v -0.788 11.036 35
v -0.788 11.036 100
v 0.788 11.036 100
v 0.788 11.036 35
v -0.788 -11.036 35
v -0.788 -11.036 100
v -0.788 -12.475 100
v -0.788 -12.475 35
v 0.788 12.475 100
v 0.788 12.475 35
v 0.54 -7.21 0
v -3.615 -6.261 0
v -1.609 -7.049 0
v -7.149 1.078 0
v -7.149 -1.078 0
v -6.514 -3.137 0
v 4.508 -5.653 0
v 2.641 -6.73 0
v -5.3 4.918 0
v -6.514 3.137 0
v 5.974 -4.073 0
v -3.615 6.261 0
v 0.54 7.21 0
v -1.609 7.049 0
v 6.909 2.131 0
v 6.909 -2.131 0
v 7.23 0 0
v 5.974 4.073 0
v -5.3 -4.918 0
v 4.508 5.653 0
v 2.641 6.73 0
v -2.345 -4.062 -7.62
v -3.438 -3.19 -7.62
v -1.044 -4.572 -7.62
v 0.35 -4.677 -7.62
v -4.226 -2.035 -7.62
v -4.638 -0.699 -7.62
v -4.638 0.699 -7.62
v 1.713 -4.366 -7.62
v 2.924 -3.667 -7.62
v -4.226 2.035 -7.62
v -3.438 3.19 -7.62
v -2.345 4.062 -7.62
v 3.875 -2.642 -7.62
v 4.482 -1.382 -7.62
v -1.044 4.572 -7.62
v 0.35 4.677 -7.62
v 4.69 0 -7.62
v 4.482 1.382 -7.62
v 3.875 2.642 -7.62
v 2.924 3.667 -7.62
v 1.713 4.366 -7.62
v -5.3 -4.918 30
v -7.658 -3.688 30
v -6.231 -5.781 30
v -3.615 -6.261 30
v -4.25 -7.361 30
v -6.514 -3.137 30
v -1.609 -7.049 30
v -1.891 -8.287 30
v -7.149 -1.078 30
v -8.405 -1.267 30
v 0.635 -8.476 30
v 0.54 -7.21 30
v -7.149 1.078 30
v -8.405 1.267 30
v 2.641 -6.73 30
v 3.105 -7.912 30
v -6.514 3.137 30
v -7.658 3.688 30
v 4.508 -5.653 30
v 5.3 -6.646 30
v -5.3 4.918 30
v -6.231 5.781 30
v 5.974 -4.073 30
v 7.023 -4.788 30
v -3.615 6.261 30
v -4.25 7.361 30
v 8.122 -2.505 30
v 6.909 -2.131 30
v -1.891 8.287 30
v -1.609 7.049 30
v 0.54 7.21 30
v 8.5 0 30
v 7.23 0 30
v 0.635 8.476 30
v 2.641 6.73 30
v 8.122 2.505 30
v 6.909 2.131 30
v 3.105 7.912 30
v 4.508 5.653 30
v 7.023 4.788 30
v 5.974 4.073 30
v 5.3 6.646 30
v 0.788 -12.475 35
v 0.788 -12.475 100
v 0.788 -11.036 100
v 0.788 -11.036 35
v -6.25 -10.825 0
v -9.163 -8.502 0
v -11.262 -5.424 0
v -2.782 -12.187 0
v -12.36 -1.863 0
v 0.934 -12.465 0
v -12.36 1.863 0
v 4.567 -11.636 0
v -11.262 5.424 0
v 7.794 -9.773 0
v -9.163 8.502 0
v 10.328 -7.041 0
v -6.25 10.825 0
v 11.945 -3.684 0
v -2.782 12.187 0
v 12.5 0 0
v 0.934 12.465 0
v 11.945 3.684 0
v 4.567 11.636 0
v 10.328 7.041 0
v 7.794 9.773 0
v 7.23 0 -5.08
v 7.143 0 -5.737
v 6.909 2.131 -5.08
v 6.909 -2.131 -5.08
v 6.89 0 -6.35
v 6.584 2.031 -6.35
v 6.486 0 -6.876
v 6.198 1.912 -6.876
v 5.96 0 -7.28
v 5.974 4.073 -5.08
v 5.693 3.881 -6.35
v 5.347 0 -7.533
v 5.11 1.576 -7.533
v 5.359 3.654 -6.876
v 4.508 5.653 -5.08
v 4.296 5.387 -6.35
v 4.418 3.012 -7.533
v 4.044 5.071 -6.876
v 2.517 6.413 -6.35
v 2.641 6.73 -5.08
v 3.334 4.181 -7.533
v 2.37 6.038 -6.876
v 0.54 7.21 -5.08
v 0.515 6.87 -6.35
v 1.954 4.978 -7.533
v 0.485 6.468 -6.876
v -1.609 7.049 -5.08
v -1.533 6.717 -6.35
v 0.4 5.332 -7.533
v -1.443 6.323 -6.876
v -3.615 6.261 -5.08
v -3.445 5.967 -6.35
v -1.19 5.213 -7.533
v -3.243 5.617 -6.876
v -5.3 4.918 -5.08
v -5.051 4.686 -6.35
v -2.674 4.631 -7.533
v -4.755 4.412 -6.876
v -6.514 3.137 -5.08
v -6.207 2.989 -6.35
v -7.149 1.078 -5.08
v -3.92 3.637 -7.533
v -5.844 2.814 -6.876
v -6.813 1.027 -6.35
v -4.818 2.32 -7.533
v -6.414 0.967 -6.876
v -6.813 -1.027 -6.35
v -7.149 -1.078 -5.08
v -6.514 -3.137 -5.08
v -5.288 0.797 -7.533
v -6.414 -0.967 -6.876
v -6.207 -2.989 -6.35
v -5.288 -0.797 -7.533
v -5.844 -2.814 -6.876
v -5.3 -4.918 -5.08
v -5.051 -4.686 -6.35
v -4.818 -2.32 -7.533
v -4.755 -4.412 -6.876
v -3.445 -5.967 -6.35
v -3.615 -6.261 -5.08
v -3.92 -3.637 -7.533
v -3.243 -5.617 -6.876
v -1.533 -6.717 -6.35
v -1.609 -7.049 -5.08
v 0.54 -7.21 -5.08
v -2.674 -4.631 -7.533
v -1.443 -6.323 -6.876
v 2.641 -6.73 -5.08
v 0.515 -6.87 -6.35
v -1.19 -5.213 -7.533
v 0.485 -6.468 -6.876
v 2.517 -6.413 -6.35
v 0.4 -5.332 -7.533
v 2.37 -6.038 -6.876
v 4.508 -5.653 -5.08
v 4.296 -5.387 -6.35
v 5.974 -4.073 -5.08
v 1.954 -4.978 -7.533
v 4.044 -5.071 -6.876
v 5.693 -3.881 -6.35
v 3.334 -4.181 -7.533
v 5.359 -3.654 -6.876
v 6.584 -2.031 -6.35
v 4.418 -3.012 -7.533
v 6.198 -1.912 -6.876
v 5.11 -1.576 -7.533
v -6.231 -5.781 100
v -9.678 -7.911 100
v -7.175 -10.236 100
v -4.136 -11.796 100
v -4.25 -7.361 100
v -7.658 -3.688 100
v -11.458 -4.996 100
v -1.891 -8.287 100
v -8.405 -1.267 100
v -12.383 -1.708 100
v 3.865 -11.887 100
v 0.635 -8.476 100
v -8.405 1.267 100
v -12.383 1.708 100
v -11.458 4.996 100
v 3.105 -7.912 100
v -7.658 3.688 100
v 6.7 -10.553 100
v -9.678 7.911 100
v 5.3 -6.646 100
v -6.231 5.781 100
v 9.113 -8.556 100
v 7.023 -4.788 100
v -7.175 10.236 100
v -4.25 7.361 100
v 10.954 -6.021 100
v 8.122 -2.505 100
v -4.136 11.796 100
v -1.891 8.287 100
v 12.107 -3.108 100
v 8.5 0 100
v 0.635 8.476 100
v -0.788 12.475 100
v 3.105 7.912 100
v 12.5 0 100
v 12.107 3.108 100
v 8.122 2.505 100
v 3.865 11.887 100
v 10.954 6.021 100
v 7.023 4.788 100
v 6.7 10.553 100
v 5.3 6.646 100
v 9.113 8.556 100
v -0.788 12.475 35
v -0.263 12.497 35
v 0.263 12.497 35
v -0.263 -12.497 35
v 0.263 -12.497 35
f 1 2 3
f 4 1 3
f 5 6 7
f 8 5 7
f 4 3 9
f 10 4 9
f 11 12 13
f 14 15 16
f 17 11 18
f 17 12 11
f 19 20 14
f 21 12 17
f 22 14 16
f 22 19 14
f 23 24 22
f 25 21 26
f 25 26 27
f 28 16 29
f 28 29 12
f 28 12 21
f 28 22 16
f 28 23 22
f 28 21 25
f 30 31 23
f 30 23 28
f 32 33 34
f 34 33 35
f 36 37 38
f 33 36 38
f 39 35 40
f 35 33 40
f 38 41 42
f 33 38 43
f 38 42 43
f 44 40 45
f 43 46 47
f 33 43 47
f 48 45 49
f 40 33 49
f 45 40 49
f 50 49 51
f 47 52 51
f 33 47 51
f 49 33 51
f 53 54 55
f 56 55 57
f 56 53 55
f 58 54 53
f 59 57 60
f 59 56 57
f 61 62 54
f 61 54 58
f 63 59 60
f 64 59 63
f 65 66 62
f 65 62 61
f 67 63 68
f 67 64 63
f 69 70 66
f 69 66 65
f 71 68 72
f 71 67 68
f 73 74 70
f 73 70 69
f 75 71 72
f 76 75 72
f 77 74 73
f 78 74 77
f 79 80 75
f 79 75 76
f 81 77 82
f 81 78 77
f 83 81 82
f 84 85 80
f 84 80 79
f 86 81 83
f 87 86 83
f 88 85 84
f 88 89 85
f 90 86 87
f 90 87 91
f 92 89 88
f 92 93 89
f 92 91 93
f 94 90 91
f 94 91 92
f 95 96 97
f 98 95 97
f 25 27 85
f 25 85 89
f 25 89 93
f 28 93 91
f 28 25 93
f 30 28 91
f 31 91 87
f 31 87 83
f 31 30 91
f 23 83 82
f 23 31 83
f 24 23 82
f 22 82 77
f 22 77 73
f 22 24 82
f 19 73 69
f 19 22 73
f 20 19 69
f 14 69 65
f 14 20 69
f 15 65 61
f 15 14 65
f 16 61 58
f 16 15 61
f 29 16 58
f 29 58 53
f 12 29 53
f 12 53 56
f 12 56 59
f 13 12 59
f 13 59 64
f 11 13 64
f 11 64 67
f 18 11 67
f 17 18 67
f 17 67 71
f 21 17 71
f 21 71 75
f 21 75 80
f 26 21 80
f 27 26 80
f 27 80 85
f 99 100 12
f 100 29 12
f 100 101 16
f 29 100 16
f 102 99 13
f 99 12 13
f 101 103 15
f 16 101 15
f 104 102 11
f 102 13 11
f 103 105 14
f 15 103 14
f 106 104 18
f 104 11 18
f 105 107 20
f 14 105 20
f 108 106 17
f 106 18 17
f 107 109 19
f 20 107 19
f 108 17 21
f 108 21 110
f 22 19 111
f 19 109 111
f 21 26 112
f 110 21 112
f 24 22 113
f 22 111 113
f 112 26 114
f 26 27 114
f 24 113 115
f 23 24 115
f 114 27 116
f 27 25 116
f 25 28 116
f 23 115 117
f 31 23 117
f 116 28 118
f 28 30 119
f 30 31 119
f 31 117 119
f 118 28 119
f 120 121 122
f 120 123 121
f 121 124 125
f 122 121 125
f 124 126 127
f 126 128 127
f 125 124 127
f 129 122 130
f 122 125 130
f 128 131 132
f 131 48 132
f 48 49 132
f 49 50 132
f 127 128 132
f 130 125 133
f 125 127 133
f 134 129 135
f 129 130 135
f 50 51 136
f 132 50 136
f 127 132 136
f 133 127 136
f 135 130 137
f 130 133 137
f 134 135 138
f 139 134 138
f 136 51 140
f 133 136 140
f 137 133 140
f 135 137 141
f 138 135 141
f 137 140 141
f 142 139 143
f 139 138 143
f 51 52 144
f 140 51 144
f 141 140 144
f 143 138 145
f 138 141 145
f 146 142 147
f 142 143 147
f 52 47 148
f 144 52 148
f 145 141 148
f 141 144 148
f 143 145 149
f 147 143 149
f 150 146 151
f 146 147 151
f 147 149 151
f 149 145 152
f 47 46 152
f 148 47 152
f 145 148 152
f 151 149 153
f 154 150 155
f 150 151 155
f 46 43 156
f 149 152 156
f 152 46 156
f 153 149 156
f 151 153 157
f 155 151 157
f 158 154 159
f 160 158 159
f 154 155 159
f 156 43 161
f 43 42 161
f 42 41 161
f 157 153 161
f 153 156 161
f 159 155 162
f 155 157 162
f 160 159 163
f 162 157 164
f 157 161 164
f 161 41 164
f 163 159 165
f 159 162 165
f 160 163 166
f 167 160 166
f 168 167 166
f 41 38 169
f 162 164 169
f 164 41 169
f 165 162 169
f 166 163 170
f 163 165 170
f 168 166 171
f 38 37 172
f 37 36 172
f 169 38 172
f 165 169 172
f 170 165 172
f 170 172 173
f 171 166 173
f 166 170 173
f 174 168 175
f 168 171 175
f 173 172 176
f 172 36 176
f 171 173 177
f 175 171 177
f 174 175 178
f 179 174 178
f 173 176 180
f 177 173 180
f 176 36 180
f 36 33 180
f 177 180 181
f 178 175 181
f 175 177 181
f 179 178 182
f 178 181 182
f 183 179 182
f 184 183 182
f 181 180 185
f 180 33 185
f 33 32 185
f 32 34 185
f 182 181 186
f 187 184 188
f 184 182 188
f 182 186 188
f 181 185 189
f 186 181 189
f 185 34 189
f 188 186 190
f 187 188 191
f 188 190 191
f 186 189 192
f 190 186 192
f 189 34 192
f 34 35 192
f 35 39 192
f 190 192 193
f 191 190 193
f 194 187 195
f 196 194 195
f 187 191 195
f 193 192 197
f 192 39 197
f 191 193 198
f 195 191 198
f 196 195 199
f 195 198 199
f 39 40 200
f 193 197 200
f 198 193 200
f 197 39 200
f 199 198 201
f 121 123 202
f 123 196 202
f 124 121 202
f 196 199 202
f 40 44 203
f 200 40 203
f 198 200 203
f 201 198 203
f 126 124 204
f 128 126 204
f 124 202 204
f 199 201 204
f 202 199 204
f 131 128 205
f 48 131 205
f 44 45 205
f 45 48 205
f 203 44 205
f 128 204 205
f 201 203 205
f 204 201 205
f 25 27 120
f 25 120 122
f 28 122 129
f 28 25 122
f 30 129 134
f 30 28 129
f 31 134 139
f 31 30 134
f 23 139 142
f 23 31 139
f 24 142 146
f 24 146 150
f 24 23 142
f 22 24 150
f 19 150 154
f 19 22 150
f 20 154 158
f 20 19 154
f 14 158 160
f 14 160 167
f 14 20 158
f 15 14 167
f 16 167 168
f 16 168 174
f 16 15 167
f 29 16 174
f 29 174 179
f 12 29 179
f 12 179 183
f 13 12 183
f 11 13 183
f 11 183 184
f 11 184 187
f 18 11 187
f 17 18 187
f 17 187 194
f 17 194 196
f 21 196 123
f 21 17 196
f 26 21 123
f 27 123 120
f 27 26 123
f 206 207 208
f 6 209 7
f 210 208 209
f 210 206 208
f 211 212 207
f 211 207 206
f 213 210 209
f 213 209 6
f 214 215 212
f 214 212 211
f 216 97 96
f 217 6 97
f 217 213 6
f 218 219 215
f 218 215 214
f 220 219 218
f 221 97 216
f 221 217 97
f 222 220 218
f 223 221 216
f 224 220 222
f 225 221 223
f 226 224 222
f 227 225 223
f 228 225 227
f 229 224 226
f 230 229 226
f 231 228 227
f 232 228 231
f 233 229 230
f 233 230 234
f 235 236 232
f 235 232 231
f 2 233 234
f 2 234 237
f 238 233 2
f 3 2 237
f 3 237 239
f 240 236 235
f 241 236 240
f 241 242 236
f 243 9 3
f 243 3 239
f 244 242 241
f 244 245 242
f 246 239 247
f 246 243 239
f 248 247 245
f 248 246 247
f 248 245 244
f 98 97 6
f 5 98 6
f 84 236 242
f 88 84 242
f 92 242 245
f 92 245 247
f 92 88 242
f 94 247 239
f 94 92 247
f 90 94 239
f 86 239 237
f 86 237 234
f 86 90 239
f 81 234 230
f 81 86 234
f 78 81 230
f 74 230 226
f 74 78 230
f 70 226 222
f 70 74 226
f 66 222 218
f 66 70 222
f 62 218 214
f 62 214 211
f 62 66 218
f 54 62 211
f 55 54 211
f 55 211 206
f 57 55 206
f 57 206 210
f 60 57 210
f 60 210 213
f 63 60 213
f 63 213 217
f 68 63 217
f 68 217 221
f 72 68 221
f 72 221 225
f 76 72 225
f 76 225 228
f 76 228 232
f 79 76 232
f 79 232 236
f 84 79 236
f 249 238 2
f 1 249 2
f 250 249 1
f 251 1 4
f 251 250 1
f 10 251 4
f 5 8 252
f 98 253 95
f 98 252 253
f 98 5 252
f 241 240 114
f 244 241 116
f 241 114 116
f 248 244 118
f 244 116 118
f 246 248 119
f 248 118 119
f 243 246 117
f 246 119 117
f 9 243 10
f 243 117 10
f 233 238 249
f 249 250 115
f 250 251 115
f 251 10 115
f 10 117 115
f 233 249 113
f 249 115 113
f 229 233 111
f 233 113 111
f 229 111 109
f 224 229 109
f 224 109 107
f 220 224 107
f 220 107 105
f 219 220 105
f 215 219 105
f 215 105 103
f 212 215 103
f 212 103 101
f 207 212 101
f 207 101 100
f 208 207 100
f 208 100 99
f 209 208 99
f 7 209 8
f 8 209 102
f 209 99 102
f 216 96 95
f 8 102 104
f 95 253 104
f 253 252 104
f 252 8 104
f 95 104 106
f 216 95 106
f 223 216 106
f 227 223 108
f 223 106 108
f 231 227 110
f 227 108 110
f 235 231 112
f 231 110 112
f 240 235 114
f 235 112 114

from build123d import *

# Parameters (mm, degrees)
F0_R     = 12.4999877
F0_R_2   = 8.4999957
F1_DEPTH = 100.000054
F0_R_3   = 7.2299957
F2_DEPTH = 5.08
F3_DEPTH = 29.99994
F5_DEPTH = 7.62
F6_R     = 2.54
F8_DEPTH = 65.000124


# Not quite as in the source:
# - a feature names something its author has since deleted; it is built from what else it names


with BuildPart() as f1:
    # F0 (on Top) → F1 (new body)
    with BuildSketch(Plane.XY):
        Circle(F0_R)
        Circle(F0_R_2, mode=Mode.SUBTRACT)
    extrude(amount=F1_DEPTH)

    # F0 (on Top) → F2 (join)
    with BuildSketch(Plane.XY):
        Circle(F0_R_2)
        Circle(F0_R_3, mode=Mode.SUBTRACT)
    extrude(amount=F2_DEPTH)

    # F0 (on Top) → F3 (join)
    with BuildSketch(Plane.XY):
        Circle(F0_R_2)
        Circle(F0_R_3, mode=Mode.SUBTRACT)
    extrude(amount=F3_DEPTH)

    # F7 (on face) → F8 (cut)
    with BuildSketch(Plane.XY.offset(100.000054)):
        Polygon((-0.7882758509, 11.0358614475), (0, 11.0358614475), (0.7882758509, 11.0358614475), (0.7882758509, 16.8001297861), (0, 16.8001297861), (-0.7882758509, 16.8001297861), align=None)
        Polygon((0, -11.0358614475), (-0.7882758509, -11.0358614475), (-0.7882758509, -16.8001297861), (0, -16.8001297861), (0.7882758509, -16.8001297861), (0.7882758509, -11.0358614475), align=None)
    extrude(amount=-F8_DEPTH, mode=Mode.SUBTRACT)


with BuildPart() as f5:
    # F0 (on Top) → F5 (new body)
    with BuildSketch(Plane.XY):
        Circle(F0_R_3)
    extrude(amount=-F5_DEPTH)

    # F6
    f6_edges = [f5.edges().sort_by_distance(p)[0] for p in [
        (-7.229996, 0, -7.62),
    ]]
    fillet(f6_edges, radius=F6_R)


solid = Compound([f1.part, f5.part])
